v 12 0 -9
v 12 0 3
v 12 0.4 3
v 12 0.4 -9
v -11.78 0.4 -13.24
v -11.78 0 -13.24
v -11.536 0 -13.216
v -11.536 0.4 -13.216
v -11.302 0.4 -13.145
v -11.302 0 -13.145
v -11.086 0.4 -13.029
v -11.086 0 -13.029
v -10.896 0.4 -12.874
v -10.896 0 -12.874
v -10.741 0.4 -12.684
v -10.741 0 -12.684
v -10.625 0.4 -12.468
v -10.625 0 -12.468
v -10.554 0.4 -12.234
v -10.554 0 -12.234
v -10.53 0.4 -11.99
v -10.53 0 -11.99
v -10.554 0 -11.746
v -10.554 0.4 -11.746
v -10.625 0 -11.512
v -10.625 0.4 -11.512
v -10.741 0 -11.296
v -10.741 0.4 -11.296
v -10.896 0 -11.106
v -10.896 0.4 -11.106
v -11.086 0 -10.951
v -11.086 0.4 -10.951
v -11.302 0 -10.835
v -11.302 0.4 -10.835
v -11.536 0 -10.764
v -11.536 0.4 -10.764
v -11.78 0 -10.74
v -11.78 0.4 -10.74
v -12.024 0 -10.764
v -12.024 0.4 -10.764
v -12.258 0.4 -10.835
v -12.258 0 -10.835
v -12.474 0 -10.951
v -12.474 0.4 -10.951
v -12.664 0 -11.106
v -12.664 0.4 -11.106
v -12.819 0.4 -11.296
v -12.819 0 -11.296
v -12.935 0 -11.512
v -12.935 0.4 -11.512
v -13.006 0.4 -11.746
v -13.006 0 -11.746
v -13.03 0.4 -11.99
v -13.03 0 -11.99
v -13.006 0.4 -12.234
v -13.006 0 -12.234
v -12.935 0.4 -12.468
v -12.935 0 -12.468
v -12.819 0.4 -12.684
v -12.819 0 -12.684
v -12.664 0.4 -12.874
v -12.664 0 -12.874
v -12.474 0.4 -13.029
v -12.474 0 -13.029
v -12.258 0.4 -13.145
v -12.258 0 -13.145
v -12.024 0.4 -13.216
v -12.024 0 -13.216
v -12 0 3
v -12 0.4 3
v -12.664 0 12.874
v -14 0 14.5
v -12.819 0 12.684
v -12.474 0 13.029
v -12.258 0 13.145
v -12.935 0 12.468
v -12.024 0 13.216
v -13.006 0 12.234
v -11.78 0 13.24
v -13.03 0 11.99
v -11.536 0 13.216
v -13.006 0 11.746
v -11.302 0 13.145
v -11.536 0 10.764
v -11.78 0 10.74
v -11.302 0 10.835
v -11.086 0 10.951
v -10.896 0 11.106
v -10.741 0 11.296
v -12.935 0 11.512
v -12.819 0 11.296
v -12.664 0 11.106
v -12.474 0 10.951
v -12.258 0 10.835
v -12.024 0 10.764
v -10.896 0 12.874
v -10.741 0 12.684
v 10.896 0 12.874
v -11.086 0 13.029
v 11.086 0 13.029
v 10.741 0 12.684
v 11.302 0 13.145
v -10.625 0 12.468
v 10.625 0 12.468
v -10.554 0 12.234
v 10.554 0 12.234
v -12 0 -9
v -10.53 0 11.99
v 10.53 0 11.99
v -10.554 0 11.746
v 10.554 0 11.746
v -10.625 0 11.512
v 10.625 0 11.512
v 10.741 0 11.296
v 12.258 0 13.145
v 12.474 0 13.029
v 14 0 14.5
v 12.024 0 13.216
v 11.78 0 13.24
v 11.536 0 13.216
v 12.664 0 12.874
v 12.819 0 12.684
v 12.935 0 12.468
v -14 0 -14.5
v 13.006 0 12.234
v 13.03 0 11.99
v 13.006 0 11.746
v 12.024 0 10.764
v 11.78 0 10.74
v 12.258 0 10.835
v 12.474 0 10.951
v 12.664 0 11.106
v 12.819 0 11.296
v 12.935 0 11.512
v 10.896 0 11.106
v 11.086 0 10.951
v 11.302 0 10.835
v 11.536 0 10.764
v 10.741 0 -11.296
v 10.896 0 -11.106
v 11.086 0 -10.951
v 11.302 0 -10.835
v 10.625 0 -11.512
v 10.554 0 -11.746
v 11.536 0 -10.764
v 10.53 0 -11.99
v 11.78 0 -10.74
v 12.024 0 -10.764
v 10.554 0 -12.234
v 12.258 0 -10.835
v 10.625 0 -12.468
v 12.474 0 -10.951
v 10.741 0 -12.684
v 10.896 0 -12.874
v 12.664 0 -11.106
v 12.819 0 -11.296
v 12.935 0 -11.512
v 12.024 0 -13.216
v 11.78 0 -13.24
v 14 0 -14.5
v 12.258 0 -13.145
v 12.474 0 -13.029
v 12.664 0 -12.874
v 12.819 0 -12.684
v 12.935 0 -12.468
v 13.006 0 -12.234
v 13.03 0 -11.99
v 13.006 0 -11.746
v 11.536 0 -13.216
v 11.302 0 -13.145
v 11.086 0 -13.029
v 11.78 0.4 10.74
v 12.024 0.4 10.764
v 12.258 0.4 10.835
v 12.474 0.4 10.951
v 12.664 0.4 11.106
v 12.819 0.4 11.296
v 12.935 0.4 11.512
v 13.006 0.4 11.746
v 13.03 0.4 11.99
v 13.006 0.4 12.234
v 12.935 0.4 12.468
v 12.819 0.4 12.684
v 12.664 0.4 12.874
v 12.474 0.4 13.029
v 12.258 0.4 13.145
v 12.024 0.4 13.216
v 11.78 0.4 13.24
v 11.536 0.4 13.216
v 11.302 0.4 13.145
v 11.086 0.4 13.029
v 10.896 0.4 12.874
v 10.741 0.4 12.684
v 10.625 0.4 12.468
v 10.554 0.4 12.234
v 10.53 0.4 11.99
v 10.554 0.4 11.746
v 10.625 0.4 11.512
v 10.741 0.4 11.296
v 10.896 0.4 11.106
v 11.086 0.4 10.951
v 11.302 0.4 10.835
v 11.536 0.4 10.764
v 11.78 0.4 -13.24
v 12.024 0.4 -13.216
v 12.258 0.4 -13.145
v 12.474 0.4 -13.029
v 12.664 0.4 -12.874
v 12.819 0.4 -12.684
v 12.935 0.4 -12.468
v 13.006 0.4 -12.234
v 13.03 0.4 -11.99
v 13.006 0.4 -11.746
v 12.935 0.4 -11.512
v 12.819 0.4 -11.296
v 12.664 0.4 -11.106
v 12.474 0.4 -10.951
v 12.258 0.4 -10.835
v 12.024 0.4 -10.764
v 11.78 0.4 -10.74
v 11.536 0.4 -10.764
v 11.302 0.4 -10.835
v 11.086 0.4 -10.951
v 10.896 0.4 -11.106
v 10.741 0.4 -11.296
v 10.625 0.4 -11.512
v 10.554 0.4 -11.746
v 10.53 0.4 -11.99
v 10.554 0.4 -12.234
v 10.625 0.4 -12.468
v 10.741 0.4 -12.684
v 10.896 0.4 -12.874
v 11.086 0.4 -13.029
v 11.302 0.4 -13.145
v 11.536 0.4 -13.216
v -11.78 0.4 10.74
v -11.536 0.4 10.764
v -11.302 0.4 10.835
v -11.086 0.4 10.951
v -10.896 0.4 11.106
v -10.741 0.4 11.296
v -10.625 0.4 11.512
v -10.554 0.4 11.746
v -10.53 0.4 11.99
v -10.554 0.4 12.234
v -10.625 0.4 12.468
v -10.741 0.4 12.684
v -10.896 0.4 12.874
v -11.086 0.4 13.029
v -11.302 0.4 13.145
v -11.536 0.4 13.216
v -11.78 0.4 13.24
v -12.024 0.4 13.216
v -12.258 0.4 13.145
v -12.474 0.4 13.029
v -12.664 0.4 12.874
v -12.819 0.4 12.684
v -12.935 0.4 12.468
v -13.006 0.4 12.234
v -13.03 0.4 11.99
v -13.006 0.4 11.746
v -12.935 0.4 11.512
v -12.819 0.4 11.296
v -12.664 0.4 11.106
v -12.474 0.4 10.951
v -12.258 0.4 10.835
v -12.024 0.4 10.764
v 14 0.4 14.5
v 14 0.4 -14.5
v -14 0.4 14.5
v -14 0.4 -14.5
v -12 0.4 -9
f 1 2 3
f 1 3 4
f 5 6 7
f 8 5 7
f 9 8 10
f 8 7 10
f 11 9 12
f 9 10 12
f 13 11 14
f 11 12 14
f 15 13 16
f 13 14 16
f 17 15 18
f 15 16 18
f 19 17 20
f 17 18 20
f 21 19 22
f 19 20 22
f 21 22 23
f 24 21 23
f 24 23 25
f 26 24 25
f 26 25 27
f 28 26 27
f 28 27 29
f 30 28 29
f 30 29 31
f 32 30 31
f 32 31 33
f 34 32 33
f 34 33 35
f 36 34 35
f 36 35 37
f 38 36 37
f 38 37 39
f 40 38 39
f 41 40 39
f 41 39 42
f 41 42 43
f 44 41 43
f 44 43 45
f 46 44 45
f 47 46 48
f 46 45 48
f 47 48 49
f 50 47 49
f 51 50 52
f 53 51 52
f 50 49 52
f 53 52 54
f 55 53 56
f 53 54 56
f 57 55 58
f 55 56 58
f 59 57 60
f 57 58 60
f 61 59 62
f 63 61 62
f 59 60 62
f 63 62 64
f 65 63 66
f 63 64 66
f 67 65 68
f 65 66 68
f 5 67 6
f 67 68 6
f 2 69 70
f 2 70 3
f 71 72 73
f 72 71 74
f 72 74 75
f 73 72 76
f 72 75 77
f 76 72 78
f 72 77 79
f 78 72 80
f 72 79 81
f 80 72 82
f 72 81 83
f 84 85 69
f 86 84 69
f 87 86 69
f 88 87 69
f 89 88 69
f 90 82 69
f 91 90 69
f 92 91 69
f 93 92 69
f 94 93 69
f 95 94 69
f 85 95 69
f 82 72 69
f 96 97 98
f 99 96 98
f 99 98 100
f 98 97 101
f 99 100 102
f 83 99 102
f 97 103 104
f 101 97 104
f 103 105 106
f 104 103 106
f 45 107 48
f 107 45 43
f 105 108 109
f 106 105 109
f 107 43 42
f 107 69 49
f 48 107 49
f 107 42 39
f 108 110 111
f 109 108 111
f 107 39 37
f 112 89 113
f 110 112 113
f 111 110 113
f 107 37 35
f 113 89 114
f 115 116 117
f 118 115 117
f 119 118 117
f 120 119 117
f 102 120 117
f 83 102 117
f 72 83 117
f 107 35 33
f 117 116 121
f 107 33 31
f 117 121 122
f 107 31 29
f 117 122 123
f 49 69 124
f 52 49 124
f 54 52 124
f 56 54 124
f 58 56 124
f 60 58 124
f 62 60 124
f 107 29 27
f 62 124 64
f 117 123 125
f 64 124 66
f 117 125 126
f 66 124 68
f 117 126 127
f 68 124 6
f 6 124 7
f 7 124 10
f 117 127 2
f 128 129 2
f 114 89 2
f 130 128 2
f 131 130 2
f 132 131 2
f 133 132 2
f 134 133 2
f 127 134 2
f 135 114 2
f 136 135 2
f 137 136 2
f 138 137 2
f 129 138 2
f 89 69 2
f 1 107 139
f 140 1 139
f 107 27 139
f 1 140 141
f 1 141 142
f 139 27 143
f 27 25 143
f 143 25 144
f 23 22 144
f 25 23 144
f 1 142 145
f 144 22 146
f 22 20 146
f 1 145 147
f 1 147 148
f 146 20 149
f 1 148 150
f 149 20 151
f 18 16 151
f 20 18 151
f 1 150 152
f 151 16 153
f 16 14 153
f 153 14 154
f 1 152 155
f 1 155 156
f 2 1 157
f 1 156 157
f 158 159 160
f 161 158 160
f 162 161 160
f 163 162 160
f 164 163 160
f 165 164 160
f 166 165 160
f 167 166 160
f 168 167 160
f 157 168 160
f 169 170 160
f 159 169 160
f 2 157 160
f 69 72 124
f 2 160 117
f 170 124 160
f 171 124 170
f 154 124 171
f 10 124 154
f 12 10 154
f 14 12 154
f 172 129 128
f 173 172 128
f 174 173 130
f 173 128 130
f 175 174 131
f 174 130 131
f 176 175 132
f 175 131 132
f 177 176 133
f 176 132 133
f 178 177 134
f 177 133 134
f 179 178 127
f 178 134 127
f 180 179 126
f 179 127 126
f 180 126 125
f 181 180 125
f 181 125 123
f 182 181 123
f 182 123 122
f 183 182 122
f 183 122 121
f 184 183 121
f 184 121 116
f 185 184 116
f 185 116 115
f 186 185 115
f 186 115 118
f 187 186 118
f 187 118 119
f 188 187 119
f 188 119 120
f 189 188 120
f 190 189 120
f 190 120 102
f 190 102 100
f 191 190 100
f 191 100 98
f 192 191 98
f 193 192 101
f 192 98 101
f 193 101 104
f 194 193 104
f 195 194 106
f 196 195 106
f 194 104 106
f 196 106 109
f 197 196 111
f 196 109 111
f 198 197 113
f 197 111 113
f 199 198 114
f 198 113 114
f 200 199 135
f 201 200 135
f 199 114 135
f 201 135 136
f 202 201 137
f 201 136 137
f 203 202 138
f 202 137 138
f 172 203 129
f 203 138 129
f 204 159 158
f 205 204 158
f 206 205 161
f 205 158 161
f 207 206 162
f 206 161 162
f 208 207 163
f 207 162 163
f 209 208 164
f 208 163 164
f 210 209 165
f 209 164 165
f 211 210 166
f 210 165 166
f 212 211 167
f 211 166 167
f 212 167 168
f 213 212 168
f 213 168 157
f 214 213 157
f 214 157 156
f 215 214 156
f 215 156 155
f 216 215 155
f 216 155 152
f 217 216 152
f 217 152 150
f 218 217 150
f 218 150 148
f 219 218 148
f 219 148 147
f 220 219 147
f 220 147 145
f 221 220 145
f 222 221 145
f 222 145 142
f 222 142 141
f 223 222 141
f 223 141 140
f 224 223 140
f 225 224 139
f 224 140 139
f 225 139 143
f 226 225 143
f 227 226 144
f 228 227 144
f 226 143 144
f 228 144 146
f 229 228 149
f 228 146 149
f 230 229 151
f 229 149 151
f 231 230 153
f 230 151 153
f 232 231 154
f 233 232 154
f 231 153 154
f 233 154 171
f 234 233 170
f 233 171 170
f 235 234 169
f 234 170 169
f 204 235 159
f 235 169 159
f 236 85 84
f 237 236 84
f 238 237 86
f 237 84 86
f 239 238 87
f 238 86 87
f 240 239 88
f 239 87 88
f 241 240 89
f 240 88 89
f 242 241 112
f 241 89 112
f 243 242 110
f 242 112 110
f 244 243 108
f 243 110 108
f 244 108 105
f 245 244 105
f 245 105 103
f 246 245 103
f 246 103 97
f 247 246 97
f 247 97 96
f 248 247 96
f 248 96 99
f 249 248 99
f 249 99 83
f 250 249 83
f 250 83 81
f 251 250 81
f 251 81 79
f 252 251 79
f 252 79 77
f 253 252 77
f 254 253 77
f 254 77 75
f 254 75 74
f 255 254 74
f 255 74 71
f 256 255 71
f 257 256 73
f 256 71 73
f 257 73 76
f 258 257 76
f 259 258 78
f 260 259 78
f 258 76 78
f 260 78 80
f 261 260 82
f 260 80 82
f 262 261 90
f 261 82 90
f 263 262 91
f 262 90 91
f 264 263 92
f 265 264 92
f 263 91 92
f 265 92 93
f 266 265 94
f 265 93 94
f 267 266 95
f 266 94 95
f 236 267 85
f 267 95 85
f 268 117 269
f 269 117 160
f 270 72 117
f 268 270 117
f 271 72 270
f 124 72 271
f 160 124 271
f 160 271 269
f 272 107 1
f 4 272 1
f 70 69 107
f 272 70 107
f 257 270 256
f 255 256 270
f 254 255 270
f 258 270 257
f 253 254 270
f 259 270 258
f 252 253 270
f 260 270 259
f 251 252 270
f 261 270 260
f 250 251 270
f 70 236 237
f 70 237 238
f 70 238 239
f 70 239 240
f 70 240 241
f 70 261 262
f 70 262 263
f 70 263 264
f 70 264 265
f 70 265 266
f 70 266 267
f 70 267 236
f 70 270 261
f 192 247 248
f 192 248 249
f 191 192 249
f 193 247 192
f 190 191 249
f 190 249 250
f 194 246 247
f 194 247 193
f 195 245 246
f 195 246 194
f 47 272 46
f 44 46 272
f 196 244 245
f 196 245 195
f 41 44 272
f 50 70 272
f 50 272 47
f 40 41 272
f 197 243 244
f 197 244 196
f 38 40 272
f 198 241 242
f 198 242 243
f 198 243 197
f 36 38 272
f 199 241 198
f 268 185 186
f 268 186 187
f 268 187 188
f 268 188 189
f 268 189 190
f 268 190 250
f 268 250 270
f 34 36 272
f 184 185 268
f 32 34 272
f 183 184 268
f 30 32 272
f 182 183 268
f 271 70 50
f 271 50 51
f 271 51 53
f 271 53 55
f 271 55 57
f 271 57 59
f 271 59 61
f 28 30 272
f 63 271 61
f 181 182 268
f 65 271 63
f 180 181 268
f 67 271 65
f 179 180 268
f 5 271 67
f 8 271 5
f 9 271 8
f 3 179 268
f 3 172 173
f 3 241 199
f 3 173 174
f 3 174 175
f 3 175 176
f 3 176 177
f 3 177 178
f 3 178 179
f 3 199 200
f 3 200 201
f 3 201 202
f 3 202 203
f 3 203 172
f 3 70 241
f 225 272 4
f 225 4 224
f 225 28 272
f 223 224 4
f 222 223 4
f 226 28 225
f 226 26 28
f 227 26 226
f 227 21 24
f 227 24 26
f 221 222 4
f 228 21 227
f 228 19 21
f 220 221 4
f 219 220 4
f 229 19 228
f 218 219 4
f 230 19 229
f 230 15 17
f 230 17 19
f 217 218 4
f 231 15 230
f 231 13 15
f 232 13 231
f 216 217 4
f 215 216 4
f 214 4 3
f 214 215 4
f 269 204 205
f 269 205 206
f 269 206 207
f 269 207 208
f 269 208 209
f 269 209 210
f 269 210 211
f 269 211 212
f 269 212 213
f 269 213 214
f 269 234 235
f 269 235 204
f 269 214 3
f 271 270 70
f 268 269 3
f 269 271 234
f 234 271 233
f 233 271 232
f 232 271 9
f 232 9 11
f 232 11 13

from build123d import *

# Parameters (mm, degrees)
ESQUISSE1_W             = 28
ESQUISSE1_H             = 29
ESQUISSE1_W_2           = 24
ESQUISSE1_H_2           = 12
BOSS_EXTRU_1_DEPTH      = 0.4
ESQUISSE2_R             = 1.25
ENL_V_MAT_EXTRU_1_DEPTH = 10


with BuildPart() as part:
    # Esquisse1 → Boss.-Extru.1 (new body)
    with BuildSketch(Plane(origin=(0, 0, 0), x_dir=(1, 0, 0), z_dir=(0, 1, 0))):
        Rectangle(ESQUISSE1_W, ESQUISSE1_H)
        with Locations((0, 3)):
            Rectangle(ESQUISSE1_W_2, ESQUISSE1_H_2, mode=Mode.SUBTRACT)
    extrude(amount=BOSS_EXTRU_1_DEPTH)

    # Esquisse2 → Enlèv. mat.-Extru.1 (cut)
    with BuildSketch(Plane.XZ):
        with Locations(Location((11.78, -11.99, 0), (0, 0, 270))):
            Circle(ESQUISSE2_R)
        with Locations(Location((-11.78, 11.99, 0), (0, 0, 270))):
            Circle(ESQUISSE2_R)
        with Locations(Location((11.78, 11.99, 0), (0, 0, 270))):
            Circle(ESQUISSE2_R)
        with Locations(Location((-11.78, -11.99, 0), (0, 0, 270))):
            Circle(ESQUISSE2_R)
    extrude(amount=-ENL_V_MAT_EXTRU_1_DEPTH, mode=Mode.SUBTRACT)


solid = part.part
